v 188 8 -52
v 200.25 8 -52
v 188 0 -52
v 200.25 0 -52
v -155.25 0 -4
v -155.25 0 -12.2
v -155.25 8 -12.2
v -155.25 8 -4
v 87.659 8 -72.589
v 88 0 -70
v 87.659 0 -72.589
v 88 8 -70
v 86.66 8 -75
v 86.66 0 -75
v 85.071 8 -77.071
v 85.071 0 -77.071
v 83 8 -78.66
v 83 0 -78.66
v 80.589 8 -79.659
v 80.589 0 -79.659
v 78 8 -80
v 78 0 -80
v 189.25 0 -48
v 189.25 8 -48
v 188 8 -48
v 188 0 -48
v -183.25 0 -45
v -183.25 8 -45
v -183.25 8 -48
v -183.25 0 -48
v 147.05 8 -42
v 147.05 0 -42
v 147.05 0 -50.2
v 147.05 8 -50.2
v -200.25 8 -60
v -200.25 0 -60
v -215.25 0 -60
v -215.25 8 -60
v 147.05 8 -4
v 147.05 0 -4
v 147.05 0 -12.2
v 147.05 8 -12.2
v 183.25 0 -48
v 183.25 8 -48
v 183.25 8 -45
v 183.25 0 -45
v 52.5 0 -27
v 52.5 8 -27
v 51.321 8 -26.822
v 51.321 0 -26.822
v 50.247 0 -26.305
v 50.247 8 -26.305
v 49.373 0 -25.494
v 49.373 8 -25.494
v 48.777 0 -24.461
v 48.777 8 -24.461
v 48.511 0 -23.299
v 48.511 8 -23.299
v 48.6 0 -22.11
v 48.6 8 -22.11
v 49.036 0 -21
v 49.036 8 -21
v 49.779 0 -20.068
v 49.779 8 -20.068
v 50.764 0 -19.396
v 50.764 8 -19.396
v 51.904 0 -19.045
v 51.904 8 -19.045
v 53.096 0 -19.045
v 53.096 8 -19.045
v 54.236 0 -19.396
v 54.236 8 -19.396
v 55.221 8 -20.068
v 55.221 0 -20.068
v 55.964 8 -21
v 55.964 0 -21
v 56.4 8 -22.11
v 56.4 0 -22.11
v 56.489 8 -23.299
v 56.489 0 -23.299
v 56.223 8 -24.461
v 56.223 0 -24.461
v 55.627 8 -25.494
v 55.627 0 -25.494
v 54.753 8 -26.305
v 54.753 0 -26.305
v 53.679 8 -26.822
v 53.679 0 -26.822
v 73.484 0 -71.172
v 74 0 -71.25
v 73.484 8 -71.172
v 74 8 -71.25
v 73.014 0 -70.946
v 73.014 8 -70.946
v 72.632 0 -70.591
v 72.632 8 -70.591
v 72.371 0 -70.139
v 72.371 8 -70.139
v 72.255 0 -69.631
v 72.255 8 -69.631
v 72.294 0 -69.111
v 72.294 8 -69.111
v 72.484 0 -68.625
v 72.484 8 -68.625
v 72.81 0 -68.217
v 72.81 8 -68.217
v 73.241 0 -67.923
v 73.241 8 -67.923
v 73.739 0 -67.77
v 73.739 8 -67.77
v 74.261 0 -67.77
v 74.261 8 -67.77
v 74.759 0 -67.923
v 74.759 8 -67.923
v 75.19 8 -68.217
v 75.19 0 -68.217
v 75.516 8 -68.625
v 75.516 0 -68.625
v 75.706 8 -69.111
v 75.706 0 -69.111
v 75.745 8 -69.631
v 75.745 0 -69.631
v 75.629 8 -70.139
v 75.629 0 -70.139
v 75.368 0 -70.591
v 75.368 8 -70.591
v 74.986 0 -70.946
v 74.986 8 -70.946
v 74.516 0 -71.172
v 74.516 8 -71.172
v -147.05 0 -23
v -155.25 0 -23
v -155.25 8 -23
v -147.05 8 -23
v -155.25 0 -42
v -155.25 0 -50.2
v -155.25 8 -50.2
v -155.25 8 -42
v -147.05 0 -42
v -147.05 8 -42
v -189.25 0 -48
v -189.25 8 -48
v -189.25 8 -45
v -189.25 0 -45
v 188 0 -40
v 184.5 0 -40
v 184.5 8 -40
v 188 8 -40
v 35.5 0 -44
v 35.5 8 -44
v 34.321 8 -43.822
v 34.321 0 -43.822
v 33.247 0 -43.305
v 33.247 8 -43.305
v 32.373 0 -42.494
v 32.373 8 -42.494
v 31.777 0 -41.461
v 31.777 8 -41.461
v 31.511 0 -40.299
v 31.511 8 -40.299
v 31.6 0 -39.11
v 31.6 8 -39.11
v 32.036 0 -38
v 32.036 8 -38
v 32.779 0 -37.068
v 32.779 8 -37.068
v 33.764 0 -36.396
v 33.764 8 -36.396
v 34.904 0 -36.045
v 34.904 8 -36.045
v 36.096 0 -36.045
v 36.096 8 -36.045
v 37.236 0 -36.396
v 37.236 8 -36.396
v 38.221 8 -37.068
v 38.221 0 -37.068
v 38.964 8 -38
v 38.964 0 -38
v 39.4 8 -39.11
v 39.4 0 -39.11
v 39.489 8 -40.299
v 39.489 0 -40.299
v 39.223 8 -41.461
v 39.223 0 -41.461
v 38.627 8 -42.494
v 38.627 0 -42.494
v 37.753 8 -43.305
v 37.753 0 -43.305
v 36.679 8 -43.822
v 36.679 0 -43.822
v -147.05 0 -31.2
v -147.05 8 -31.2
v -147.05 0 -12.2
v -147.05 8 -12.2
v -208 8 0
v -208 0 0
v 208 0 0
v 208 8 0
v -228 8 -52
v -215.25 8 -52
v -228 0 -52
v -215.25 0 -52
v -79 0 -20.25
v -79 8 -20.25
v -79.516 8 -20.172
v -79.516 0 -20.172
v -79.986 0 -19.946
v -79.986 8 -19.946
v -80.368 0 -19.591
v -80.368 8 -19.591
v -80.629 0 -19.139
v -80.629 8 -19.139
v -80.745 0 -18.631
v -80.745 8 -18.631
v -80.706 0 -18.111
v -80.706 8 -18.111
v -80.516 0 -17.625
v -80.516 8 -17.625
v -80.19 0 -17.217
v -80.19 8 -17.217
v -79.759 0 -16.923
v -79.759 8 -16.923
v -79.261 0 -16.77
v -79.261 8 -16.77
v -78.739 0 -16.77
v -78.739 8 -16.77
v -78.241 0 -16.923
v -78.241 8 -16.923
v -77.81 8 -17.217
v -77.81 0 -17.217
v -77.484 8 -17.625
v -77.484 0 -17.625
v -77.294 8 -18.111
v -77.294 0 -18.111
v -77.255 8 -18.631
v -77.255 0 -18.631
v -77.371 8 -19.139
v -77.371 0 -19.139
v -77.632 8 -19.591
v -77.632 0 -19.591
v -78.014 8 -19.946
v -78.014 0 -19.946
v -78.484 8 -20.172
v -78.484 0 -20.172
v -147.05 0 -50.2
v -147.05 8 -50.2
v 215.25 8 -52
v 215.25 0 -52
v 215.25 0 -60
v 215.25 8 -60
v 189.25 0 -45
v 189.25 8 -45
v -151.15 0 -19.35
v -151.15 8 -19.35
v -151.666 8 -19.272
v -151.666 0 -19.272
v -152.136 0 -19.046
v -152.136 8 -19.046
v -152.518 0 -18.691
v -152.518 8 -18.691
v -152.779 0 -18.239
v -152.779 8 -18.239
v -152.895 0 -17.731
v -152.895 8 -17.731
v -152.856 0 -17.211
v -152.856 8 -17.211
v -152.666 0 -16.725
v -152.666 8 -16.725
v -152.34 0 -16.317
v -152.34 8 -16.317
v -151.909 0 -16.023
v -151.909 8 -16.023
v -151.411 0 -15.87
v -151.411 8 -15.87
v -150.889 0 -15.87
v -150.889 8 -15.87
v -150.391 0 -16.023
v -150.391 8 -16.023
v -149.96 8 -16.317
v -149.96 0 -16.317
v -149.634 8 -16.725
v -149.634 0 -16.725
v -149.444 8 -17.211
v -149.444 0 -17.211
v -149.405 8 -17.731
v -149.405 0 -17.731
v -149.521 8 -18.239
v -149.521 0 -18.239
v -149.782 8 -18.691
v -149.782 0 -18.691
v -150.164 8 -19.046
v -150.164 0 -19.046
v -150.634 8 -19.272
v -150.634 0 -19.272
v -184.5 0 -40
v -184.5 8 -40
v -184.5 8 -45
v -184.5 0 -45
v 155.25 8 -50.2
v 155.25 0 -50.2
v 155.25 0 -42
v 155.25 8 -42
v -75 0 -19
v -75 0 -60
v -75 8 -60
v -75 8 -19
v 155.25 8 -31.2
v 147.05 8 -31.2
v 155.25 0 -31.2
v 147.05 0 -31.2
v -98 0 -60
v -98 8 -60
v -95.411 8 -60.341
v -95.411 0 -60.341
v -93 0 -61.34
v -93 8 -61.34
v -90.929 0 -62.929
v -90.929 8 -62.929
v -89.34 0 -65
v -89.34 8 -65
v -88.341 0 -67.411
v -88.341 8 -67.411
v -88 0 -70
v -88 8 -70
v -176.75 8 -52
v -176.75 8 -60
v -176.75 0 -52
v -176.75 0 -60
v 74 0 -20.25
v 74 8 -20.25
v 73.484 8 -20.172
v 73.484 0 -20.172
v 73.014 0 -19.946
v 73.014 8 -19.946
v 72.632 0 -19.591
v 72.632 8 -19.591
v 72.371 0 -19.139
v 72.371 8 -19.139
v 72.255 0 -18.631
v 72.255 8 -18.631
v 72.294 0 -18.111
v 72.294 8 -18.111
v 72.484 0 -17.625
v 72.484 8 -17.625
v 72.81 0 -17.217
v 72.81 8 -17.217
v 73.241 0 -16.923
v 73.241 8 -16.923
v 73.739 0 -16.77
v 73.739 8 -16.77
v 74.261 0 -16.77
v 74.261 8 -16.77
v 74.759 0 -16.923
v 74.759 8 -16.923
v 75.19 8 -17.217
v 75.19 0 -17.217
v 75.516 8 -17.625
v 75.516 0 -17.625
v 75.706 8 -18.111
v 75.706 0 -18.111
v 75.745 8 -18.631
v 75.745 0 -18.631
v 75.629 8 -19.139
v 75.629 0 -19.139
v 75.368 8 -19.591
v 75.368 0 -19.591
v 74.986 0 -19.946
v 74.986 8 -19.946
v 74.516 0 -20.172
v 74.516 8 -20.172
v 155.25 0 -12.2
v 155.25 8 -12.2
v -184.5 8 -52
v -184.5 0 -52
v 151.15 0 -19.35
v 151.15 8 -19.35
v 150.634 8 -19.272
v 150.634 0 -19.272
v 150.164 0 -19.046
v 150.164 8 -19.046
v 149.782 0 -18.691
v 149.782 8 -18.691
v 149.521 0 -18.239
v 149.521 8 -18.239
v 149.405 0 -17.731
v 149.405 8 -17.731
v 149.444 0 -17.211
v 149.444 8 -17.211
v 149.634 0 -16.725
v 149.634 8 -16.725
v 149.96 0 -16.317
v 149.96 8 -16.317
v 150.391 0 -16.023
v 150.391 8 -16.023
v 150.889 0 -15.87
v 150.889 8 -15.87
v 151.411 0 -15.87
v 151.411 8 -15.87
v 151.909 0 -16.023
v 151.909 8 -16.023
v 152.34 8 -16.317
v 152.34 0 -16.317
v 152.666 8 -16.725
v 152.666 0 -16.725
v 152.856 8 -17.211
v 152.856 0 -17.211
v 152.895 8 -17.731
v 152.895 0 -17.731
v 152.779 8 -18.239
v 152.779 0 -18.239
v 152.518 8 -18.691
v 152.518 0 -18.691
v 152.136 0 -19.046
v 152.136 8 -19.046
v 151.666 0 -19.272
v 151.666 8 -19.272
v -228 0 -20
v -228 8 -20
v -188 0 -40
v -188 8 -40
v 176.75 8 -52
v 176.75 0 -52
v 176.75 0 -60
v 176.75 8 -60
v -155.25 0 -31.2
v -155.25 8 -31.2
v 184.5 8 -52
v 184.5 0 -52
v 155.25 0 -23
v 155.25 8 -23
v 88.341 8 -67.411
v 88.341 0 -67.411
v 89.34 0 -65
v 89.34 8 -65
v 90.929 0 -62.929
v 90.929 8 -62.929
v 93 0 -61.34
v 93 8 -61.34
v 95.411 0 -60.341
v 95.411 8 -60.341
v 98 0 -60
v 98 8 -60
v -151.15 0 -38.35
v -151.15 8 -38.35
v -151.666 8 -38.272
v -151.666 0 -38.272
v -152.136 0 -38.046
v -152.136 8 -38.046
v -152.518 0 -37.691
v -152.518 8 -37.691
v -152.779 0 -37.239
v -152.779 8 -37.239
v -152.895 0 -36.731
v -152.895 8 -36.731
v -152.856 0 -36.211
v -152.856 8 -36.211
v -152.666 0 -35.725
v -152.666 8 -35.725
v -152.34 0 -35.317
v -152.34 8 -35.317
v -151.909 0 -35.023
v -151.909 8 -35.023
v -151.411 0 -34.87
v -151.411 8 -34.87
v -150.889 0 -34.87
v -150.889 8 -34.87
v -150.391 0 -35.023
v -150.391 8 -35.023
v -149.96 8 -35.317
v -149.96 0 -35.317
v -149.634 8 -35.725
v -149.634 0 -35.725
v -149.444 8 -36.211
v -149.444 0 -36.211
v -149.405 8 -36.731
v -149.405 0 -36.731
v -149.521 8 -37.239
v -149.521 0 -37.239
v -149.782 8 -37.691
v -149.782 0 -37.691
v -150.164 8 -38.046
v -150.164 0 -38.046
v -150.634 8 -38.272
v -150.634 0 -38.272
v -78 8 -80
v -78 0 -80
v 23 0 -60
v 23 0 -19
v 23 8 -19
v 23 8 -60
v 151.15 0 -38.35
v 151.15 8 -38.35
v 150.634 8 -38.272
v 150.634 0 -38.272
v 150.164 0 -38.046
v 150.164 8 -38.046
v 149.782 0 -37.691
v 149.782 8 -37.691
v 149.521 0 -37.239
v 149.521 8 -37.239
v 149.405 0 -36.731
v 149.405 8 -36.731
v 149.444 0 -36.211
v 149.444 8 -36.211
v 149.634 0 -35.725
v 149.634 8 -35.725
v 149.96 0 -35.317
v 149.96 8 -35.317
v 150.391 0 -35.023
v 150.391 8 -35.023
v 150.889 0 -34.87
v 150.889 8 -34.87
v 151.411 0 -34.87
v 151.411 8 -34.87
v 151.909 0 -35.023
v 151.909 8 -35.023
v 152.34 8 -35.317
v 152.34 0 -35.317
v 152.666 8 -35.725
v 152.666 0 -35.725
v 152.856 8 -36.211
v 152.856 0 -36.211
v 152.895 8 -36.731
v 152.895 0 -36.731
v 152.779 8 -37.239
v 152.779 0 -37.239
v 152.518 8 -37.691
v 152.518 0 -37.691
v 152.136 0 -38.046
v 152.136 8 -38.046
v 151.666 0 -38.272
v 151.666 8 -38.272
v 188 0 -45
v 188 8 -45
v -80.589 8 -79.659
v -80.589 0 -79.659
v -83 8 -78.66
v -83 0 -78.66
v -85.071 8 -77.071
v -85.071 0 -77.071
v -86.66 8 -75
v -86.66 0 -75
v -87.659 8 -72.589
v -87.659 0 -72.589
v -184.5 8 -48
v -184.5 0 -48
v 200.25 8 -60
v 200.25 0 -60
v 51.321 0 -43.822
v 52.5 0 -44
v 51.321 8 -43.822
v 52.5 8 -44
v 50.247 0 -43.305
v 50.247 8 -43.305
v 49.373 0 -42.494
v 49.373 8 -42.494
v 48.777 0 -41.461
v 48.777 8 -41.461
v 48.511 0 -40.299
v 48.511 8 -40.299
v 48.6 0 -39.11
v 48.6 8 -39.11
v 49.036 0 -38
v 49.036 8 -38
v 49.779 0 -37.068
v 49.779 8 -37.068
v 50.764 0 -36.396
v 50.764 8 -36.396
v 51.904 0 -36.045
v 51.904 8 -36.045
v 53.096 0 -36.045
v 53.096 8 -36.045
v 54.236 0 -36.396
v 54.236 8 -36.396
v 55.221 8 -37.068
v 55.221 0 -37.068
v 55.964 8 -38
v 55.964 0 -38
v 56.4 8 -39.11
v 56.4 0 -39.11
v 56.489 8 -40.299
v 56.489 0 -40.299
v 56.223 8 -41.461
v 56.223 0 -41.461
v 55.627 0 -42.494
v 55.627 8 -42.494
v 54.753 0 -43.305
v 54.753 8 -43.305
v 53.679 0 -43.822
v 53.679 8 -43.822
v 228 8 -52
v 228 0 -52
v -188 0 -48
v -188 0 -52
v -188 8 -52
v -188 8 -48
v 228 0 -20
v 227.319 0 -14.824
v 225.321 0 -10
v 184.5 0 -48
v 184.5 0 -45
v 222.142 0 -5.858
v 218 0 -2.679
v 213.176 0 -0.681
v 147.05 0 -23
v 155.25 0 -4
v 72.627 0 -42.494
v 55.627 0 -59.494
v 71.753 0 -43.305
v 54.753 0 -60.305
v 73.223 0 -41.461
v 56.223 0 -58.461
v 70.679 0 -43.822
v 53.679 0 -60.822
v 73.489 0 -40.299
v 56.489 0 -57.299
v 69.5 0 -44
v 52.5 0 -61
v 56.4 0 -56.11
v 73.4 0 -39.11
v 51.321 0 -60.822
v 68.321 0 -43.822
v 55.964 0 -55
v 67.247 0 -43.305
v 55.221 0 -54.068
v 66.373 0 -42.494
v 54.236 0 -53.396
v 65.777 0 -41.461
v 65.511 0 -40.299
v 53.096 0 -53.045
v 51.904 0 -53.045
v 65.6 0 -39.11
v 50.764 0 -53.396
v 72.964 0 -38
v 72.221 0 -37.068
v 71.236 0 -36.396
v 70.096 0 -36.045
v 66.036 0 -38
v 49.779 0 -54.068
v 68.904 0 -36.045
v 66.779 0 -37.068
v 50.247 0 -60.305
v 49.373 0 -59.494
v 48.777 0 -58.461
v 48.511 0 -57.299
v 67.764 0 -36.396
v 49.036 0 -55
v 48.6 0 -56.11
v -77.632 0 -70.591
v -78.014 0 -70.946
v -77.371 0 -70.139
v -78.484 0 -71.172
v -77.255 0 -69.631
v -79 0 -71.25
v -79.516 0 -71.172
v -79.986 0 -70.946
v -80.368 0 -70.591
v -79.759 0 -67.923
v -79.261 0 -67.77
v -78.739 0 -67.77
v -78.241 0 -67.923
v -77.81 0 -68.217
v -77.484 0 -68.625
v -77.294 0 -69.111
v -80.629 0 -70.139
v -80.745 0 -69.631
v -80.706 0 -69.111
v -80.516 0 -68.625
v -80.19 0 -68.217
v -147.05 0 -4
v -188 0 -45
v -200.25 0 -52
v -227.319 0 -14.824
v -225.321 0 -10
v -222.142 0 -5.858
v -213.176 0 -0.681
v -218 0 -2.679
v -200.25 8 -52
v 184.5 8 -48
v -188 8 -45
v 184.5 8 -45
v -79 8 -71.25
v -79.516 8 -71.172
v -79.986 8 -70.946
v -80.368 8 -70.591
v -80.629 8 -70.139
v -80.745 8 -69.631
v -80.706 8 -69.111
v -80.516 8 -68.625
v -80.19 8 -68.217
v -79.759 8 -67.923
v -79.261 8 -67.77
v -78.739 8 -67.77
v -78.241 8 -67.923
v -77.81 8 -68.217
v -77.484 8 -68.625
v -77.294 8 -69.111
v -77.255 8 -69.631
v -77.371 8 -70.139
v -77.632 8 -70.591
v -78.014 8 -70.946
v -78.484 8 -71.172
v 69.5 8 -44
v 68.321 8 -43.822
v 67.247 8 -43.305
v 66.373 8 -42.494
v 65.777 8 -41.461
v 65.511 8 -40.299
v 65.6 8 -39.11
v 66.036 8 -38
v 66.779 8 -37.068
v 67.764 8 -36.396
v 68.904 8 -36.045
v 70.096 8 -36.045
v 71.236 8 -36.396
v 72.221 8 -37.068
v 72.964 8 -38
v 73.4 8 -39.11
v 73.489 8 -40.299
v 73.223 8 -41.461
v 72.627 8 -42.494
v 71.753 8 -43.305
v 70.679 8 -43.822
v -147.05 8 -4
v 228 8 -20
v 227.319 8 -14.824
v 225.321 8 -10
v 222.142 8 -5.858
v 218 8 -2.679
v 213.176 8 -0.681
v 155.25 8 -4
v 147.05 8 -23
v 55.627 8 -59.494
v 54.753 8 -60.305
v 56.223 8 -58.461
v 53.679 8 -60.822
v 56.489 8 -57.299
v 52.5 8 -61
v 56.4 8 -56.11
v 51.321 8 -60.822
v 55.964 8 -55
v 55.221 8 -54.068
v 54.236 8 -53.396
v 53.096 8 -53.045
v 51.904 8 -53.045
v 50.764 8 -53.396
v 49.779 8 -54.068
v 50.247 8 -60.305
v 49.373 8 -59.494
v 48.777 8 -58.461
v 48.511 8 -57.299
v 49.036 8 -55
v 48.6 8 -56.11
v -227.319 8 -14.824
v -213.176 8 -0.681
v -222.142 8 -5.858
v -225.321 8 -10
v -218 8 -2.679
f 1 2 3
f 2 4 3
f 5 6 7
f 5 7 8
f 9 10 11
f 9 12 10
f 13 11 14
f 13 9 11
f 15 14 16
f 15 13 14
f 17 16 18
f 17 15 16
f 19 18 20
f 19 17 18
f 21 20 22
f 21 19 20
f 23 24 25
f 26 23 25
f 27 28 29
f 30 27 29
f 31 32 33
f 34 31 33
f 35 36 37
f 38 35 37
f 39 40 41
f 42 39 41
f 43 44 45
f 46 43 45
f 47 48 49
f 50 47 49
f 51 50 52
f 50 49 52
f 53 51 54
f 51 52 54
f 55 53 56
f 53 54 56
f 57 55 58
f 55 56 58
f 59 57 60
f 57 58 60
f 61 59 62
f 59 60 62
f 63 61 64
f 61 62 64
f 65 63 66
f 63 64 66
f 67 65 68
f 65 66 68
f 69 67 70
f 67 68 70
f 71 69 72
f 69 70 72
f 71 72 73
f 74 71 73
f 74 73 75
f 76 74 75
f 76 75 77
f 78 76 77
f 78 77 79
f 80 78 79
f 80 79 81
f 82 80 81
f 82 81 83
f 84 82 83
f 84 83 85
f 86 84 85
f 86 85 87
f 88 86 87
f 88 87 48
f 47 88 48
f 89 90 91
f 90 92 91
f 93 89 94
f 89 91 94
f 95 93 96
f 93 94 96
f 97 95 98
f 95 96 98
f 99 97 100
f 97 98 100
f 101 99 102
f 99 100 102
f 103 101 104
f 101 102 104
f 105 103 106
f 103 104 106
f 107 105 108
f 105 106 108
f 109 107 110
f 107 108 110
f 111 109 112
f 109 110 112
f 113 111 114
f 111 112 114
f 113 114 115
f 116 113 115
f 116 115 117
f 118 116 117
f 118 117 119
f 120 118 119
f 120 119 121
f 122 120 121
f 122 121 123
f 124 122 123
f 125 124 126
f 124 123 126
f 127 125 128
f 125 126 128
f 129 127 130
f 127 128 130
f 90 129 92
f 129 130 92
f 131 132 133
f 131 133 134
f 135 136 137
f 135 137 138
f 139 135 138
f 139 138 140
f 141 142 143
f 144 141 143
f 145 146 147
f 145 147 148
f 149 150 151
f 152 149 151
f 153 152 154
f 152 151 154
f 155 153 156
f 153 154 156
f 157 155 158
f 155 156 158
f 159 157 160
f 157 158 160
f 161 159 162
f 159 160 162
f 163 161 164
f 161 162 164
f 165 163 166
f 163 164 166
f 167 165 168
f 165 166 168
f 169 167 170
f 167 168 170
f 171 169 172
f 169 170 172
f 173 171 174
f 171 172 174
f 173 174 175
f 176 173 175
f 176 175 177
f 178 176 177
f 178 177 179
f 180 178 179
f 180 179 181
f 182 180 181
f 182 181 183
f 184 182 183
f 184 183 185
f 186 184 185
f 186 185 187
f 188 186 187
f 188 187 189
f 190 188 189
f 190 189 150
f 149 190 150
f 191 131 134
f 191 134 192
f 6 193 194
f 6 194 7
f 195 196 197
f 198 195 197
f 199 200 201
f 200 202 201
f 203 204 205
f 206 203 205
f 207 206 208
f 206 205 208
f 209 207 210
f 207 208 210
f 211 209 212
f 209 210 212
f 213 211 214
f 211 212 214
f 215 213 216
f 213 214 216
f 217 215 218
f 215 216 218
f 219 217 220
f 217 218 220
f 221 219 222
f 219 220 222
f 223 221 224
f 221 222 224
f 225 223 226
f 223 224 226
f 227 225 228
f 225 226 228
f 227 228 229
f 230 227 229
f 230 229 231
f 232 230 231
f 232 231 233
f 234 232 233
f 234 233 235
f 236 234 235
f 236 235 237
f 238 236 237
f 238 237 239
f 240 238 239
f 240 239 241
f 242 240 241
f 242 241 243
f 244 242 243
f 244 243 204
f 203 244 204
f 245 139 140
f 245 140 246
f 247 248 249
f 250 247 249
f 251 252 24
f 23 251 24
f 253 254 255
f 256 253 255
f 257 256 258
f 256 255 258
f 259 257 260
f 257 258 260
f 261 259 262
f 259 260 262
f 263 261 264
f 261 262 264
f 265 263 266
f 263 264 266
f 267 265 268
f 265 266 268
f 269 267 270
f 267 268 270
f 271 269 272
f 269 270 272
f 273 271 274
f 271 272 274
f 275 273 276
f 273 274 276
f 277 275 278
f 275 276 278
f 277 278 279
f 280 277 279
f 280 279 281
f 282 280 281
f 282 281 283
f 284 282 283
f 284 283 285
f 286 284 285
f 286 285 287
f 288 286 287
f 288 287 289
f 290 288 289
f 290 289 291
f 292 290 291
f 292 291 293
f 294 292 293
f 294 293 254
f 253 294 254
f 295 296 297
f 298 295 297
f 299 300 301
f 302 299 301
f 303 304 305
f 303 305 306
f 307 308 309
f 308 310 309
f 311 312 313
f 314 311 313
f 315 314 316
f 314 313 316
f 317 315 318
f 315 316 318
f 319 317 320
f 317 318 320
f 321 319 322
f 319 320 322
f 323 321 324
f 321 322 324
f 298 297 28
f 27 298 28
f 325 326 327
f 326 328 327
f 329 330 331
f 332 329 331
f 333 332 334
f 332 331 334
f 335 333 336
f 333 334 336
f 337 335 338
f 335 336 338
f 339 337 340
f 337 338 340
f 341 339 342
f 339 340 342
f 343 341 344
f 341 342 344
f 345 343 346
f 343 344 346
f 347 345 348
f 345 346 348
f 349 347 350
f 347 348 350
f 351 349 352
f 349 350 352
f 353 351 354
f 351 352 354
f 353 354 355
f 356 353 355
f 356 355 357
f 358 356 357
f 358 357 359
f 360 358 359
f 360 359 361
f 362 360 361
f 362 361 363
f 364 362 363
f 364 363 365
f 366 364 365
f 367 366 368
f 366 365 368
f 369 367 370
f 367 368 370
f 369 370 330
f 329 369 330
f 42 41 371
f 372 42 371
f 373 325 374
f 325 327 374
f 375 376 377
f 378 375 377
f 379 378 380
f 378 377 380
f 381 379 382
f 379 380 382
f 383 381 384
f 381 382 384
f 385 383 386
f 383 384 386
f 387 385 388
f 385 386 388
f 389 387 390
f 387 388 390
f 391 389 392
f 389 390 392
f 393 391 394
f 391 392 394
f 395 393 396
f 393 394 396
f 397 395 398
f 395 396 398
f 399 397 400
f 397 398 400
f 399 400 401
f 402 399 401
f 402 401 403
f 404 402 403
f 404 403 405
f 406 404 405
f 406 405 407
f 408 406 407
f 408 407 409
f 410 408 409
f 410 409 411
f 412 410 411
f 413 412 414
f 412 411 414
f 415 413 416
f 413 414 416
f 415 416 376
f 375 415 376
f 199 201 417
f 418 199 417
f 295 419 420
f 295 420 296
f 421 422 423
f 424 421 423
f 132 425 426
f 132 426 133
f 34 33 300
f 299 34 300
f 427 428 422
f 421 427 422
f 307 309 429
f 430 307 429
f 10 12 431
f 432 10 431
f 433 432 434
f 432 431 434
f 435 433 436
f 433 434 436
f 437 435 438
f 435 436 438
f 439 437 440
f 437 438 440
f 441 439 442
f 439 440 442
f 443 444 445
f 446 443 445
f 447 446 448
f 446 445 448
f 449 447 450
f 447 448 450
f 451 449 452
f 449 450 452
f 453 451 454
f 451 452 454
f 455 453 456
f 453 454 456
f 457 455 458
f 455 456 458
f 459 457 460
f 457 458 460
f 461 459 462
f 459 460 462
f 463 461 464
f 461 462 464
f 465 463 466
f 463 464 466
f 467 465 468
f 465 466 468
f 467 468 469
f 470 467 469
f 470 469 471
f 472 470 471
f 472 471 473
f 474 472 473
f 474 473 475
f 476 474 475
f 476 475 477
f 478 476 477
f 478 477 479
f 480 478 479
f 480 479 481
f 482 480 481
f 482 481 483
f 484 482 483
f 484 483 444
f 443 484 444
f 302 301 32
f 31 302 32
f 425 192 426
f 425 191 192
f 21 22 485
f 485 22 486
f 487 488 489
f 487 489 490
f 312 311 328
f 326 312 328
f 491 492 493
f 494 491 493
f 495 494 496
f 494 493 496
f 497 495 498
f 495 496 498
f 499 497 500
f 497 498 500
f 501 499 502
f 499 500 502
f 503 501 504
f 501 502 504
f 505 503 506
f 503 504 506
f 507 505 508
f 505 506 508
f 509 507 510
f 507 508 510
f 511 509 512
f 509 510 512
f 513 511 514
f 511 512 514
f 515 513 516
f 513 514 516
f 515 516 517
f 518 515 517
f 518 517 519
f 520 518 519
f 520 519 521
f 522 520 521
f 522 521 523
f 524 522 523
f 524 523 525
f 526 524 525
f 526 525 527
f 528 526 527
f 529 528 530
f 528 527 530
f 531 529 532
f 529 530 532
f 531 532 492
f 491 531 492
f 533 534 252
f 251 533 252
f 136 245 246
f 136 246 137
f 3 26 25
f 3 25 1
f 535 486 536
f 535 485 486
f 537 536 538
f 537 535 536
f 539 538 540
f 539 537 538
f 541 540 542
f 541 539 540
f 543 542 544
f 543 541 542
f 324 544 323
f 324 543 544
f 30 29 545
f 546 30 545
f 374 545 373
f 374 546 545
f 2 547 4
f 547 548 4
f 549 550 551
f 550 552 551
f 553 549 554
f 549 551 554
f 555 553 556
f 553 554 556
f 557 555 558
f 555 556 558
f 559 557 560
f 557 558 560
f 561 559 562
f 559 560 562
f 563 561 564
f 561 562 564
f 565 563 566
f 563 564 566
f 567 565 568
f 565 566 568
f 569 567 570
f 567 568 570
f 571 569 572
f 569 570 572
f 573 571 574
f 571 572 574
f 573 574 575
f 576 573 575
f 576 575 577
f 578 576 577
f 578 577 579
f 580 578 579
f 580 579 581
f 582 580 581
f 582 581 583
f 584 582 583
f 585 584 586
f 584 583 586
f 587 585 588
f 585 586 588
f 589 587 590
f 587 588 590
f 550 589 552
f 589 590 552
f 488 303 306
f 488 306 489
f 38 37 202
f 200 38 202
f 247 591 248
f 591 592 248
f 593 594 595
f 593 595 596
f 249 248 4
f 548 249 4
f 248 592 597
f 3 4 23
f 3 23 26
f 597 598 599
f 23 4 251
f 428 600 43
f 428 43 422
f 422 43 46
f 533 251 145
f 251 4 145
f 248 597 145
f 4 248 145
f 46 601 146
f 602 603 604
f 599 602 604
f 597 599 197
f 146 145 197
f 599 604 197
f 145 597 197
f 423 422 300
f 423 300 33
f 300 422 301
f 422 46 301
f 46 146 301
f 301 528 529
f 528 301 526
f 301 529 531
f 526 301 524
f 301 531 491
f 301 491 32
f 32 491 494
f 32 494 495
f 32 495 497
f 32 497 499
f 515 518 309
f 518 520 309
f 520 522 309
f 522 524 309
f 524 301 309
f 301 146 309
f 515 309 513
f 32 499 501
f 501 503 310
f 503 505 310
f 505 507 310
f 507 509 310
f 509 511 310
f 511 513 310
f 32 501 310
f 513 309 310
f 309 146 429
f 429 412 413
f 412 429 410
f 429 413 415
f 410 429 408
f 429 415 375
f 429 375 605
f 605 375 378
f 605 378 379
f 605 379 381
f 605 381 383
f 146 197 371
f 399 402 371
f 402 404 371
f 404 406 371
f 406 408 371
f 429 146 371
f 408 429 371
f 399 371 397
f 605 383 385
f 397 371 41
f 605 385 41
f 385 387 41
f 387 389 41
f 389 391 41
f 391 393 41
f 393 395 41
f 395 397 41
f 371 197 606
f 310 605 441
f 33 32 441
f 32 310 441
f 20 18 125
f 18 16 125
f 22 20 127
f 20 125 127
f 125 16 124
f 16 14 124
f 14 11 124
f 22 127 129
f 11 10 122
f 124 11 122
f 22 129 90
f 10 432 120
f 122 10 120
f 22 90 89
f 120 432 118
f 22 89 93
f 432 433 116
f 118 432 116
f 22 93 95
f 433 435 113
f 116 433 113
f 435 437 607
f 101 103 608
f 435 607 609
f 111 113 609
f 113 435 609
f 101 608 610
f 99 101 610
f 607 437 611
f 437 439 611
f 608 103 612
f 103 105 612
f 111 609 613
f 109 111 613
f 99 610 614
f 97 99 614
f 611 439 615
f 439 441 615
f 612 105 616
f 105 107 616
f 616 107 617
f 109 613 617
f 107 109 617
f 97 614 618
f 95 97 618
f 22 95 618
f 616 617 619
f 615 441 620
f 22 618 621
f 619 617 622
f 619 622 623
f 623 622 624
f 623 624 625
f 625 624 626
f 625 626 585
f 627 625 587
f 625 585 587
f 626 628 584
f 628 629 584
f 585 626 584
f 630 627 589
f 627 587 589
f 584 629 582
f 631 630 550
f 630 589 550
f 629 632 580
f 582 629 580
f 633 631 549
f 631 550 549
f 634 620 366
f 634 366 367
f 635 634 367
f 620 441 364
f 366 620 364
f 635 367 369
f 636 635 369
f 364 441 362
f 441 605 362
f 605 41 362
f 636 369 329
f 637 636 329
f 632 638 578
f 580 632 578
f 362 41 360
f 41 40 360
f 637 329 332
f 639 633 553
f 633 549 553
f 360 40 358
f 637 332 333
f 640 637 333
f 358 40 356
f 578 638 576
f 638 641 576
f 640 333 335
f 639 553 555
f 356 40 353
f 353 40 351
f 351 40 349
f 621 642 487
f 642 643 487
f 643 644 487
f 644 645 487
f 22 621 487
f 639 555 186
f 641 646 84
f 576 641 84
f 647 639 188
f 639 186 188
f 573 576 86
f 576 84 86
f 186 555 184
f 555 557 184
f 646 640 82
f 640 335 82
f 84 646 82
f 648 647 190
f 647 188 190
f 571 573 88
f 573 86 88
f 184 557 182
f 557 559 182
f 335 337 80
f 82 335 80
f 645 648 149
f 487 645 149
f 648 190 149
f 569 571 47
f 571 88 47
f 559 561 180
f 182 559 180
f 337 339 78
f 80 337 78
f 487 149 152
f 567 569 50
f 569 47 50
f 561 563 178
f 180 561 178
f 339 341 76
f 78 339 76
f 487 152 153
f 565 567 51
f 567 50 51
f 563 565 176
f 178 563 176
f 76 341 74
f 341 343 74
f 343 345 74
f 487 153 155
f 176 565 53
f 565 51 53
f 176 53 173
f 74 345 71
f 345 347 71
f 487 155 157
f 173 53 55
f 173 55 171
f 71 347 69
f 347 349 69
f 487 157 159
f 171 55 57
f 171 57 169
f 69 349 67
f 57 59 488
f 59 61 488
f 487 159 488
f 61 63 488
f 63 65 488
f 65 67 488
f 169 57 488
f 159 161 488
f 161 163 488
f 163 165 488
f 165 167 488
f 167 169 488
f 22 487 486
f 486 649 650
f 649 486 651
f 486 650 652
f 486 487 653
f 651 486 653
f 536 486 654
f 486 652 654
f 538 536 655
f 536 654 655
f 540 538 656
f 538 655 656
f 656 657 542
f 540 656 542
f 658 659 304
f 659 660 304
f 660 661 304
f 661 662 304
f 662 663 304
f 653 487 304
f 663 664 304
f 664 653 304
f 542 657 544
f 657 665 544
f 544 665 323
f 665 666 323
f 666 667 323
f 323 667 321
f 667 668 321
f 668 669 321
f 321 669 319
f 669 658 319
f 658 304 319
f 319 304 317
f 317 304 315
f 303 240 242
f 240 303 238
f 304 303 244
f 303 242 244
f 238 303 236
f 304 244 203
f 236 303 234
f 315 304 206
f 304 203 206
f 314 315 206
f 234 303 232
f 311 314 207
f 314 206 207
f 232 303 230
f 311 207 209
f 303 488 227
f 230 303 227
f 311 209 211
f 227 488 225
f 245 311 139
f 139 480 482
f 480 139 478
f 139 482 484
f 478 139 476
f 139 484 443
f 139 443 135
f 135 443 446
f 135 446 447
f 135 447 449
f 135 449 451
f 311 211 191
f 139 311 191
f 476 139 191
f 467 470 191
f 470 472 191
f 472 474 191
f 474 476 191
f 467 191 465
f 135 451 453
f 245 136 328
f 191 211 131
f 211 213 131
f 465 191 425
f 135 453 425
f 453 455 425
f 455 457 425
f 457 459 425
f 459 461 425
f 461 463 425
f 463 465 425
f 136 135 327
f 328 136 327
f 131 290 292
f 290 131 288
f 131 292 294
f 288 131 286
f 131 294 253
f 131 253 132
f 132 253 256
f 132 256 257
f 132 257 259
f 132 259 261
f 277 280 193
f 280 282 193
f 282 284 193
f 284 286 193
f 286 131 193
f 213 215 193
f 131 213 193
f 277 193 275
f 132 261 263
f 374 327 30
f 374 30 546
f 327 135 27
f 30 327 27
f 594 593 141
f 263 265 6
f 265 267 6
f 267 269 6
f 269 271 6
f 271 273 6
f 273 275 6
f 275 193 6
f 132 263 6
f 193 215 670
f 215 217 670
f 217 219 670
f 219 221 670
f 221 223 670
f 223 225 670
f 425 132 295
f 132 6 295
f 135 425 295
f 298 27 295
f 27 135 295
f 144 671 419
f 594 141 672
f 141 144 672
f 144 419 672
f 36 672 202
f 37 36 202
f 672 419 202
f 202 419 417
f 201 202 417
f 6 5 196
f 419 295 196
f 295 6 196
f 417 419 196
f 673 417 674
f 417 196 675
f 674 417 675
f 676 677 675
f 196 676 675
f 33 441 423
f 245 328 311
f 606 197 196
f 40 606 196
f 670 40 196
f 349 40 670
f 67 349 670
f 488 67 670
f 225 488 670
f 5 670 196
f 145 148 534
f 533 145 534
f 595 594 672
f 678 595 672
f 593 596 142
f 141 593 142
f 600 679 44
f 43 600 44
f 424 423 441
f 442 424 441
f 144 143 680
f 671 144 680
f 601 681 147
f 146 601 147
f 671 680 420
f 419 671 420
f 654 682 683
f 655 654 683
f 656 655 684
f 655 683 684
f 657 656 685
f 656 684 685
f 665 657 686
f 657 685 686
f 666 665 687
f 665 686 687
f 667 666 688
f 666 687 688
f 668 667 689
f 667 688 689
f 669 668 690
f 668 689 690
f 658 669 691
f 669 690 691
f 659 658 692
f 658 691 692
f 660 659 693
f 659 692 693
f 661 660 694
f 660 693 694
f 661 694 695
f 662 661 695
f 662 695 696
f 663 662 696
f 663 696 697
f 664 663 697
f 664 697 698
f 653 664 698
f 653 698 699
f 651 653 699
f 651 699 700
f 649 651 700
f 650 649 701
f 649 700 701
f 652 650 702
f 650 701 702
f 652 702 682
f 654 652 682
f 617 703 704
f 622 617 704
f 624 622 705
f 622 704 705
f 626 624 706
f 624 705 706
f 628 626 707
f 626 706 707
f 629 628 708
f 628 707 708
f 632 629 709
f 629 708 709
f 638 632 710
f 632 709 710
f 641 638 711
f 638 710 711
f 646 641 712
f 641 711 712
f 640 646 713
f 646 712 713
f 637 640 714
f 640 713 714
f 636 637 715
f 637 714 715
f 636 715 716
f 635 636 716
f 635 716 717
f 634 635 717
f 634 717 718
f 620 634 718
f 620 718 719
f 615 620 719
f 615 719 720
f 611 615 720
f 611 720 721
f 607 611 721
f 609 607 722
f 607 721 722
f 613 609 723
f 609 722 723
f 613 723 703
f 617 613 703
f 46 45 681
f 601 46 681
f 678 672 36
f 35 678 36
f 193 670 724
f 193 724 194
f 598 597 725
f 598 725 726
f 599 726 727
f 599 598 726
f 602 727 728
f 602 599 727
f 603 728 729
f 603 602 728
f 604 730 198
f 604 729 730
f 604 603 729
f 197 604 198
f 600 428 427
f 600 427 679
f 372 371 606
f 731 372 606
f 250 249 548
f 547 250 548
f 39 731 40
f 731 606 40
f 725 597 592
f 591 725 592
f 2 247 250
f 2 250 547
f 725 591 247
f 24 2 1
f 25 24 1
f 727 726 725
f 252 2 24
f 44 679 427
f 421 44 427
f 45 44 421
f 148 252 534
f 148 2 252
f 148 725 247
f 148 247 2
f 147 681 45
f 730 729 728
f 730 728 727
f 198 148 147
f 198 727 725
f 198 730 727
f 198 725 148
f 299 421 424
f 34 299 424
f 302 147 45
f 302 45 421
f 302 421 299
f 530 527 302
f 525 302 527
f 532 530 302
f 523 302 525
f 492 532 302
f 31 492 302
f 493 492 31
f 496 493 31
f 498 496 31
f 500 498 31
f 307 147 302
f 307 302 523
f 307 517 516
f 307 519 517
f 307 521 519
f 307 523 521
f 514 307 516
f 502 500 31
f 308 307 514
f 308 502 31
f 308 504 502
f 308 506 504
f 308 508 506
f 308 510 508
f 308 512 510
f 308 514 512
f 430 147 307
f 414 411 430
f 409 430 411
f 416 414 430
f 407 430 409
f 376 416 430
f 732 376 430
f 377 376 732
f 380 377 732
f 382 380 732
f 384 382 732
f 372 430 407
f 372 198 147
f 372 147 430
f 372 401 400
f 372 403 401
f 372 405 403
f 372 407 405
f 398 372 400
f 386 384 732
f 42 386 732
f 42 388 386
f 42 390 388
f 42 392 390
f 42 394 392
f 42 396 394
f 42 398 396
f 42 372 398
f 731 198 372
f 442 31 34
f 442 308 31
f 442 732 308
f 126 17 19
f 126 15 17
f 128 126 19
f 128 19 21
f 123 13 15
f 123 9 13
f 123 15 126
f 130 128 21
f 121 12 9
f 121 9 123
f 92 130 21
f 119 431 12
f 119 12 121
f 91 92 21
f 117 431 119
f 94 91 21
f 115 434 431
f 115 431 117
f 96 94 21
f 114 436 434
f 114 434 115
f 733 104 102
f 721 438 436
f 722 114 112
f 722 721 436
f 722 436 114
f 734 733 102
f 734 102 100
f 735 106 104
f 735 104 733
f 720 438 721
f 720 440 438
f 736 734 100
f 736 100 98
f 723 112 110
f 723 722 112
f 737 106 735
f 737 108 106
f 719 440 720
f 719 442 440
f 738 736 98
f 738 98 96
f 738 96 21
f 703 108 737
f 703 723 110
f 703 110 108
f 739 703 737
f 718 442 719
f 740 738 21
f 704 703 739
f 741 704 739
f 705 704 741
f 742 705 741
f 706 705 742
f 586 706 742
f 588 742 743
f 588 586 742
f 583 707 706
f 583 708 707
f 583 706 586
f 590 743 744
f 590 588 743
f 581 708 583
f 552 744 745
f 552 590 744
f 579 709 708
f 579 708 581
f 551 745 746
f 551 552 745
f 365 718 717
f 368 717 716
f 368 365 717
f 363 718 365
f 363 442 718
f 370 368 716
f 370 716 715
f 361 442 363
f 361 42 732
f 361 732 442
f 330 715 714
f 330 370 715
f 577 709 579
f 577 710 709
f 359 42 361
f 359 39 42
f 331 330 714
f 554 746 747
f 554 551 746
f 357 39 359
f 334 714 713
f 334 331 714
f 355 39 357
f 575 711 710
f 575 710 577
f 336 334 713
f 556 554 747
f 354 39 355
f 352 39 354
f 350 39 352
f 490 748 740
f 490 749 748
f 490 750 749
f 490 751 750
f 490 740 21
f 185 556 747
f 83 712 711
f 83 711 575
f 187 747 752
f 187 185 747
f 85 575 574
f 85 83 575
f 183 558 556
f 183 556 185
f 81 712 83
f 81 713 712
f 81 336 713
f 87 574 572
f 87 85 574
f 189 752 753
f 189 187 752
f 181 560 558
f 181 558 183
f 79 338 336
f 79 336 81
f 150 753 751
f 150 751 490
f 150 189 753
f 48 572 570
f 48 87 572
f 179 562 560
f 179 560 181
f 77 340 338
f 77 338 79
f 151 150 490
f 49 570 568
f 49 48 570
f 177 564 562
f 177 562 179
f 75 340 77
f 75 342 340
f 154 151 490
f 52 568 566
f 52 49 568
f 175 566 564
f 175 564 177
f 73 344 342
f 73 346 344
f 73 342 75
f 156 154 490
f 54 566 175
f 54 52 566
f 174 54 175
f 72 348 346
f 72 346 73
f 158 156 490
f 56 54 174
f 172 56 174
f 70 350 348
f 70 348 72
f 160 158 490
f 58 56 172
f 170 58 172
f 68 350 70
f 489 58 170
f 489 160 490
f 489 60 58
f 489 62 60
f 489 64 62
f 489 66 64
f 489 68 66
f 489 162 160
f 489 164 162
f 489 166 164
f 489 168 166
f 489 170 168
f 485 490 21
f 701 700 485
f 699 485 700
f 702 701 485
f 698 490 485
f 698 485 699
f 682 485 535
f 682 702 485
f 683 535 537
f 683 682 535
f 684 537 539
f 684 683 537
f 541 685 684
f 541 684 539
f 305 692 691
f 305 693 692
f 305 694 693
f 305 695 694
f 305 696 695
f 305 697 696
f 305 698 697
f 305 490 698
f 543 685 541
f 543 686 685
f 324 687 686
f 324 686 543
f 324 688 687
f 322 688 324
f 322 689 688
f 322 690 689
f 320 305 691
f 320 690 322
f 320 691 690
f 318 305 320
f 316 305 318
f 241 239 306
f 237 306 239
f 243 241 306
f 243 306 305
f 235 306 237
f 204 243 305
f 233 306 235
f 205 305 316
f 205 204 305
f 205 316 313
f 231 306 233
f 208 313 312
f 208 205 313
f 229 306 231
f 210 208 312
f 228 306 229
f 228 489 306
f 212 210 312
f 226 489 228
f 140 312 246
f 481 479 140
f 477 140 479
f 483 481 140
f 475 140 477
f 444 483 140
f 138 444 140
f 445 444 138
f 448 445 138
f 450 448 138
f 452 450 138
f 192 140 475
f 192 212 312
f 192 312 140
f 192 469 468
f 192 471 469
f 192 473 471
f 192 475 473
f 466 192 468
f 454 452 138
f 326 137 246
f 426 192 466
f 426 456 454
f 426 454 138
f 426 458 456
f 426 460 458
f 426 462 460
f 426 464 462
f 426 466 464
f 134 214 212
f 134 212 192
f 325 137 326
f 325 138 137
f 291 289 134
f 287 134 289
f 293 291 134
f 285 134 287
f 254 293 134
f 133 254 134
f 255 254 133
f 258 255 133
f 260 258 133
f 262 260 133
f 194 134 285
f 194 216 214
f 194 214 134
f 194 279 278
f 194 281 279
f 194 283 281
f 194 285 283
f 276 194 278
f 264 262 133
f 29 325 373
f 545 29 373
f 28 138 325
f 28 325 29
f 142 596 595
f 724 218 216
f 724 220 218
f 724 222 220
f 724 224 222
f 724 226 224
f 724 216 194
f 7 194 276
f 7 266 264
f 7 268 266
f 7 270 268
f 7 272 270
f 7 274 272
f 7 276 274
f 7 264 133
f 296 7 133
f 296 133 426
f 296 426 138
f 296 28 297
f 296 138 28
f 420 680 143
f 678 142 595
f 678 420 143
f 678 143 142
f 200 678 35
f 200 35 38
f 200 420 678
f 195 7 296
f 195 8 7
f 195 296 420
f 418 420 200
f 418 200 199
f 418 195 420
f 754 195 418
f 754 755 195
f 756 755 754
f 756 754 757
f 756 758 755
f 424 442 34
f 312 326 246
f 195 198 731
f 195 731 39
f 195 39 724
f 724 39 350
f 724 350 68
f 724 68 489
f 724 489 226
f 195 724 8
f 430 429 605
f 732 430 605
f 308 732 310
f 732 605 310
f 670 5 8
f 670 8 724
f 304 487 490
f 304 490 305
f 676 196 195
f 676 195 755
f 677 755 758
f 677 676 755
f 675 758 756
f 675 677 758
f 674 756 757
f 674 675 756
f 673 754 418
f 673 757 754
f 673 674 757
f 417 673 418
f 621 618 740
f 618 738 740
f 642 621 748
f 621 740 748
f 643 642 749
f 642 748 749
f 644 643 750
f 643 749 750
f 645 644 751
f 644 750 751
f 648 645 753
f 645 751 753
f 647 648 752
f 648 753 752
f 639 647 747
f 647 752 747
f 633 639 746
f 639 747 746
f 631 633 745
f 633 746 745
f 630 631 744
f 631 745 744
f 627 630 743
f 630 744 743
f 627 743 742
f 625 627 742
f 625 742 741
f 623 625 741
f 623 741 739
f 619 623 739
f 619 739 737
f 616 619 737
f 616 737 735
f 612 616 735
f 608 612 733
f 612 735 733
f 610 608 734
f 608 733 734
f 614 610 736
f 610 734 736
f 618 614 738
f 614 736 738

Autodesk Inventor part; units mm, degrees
ref_plane "YZ Plane" through (0, 0, 0) normal (1, 0, 0) x (0, 1, 0)
ref_plane "XY Plane" through (0, 0, 0) normal (0, 0, 1) x (1, 0, 0)
sketch "Sketch1" plane through (0, 0, 0) normal (0, 1, 0) x (-1, 0, 0)
  line L0 (208, 0) -> (-208, 0)
  line L1 (-228, -20) -> (-228, -52)
  line L2 (-228, -52) -> (-215.25, -52)
  line L3 (-215.25, -52) -> (-215.25, -60)
  line L4 (-215.25, -60) -> (-200.25, -60)
  line L5 (-200.25, -60) -> (-200.25, -52)
  line L6 (-200.25, -52) -> (-176.75, -52)
  line L7 (-176.75, -52) -> (-176.75, -60)
  line L8 (-176.75, -60) -> (-88, -60)
  line L9 (-88, -60) -> (-88, -80)
  line L10 (-88, -80) -> (88, -80)
  line L11 (88, -80) -> (88, -60)
  line L12 (88, -60) -> (176.75, -60)
  line L13 (176.75, -60) -> (176.75, -52)
  line L14 (176.75, -52) -> (200.25, -52)
  line L15 (200.25, -52) -> (200.25, -60)
  line L16 (200.25, -60) -> (215.25, -60)
  line L17 (215.25, -60) -> (215.25, -52)
  line L18 (215.25, -52) -> (228, -52)
  line L19 (228, -52) -> (228, -20)
  line L20 (0, -80) -> (0, 0) construction
  arc A0 (228, -20) -> (208, 0) centre (208, -20) ccw
  arc A1 (-208, 0) -> (-228, -20) centre (-208, -20) ccw
  line L21 (75, -19) -> (-23, -19)
  line L22 (-23, -19) -> (-23, -60)
  line L23 (-23, -60) -> (75, -60)
  line L24 (75, -60) -> (75, -19)
  line L25 (155.25, -4) -> (147.05, -4)
  line L26 (147.05, -4) -> (147.05, -12.2)
  line L27 (147.05, -12.2) -> (155.25, -12.2)
  line L28 (155.25, -12.2) -> (155.25, -4)
  line L29 (155.25, -23) -> (147.05, -23)
  line L30 (147.05, -23) -> (147.05, -31.2)
  line L31 (147.05, -31.2) -> (155.25, -31.2)
  line L32 (155.25, -31.2) -> (155.25, -23)
  line L33 (155.25, -42) -> (147.05, -42)
  line L34 (147.05, -42) -> (147.05, -50.2)
  line L35 (147.05, -50.2) -> (155.25, -50.2)
  line L36 (155.25, -50.2) -> (155.25, -42)
  line L37 (151.15, -42) -> (151.15, -31.2) construction
  line L38 (151.15, -23) -> (151.15, -12.2) construction
  line L39 (-155.25, -4) -> (-147.05, -4)
  line L40 (-147.05, -4) -> (-147.05, -12.2)
  line L41 (-147.05, -12.2) -> (-155.25, -12.2)
  line L42 (-155.25, -12.2) -> (-155.25, -4)
  line L43 (-155.25, -23) -> (-147.05, -23)
  line L44 (-147.05, -23) -> (-147.05, -31.2)
  line L45 (-147.05, -31.2) -> (-155.25, -31.2)
  line L46 (-155.25, -31.2) -> (-155.25, -23)
  line L47 (-155.25, -42) -> (-147.05, -42)
  line L48 (-147.05, -42) -> (-147.05, -50.2)
  line L49 (-147.05, -50.2) -> (-155.25, -50.2)
  line L50 (-155.25, -50.2) -> (-155.25, -42)
  line L51 (-151.15, -42) -> (-151.15, -31.2) construction
  line L52 (-151.15, -23) -> (-151.15, -12.2) construction
  line L53 (79, -69.5) -> (-74, -69.5) construction
  line L54 (-74, -69.5) -> (-74, -18.5) construction
  line L55 (-74, -18.5) -> (79, -18.5) construction
  line L56 (79, -18.5) -> (79, -69.5) construction
  line L57 (-35.5, -40) -> (-69.5, -40) construction
  line L58 (-52.5, -57) -> (-52.5, -23) construction
  line L59 (188, -52) -> (188, -48)
  line L60 (188, -48) -> (189.25, -48)
  line L61 (189.25, -48) -> (189.25, -45)
  line L62 (189.25, -45) -> (188, -45)
  line L63 (188, -45) -> (188, -40)
  line L64 (188, -40) -> (184.5, -40)
  line L65 (184.5, -40) -> (184.5, -45)
  line L66 (184.5, -45) -> (183.25, -45)
  line L67 (183.25, -45) -> (183.25, -48)
  line L68 (183.25, -48) -> (184.5, -48)
  line L69 (184.5, -48) -> (184.5, -52)
  line L70 (-184.5, -52) -> (-184.5, -48)
  line L71 (-184.5, -48) -> (-183.25, -48)
  line L72 (-183.25, -48) -> (-183.25, -45)
  line L73 (-183.25, -45) -> (-184.5, -45)
  line L74 (-184.5, -45) -> (-184.5, -40)
  line L75 (-184.5, -40) -> (-188, -40)
  line L76 (-188, -40) -> (-188, -45)
  line L77 (-188, -45) -> (-189.25, -45)
  line L78 (-189.25, -45) -> (-189.25, -48)
  line L79 (-189.25, -48) -> (-188, -48)
  line L80 (-188, -48) -> (-188, -52)
  point P0 (228, 0)
  point P1 (-228, 0)
  point P2 (151.15, -36.6)
  point P3 (151.15, -17.6)
  point P4 (-151.15, -36.6)
  point P5 (-151.15, -17.6)
  point P6 (-52.5, -40)
  point P7 (-52.5, -40)
  dimension "d0" = 456
  dimension "d1" = 80
  dimension "d2" = 60
  dimension "d3" = 8
  dimension "d4" = 140
  dimension "d5" = 23.5
  dimension "d6" = 15
  dimension "d7" = 12.75
  dimension "d8" = 20
  dimension "d9" = 19
  dimension "d10" = 41
  dimension "d11" = 98
  dimension "d12" = 153
  dimension "d13" = 8.2
  dimension "d14" = 8.2
  dimension "d15" = 72.75
  dimension "d16" = 4
  dimension "d17" = 23
  dimension "d18" = 42
  dimension "d19" = 18.5
  dimension "d20" = 51
  dimension "d21" = 153
  dimension "d22" = 149
  dimension "d23" = 40
  dimension "d24" = 29.5
  dimension "d25" = 34
  dimension "d26" = 34
  dimension "d27" = 4
  dimension "d28" = 3
  dimension "d29" = 5
  dimension "d30" = 6
  dimension "d31" = 3.5
  dimension "d32" = 40
  dimension "d34" = 3.5
  dimension "d35" = 6
  dimension "d36" = 40
extrude "Extrusion1" add sketch "Sketch1" along normal blind 8 contours A0 L19 L18 L17 L16 L15 L14 L59 L60 L61 L62 L63 L64 L65 L66 L67 L68 L69 L13 L12 L11 L10 L9 L8 L7 L6 L70 L71 L72 L73 L74 L75 L76 L77 L78 L79 L80 L5 L4 L3 L2 L1 A1 L0
fillet "Fillet1" radius 10 4 edges at (-88, 4, -60) (-88, 4, -80) (88, 4, -80) (88, 4, -60)
hole "Hole1" at (-151.15, 0, -36.6) at (-151.15, 0, -17.6) at (151.15, 0, -17.6) at (151.15, 0, -36.6) at (-79, 0, -69.5) at (-79, 0, -18.5) at (74, 0, -18.5) at (74, 0, -69.5) direction (0, 1, 0) diameter 3.5 end through all
hole "Hole2" at (35.5, 0, -40) at (52.5, 0, -57) at (52.5, 0, -40) at (69.5, 0, -40) at (52.5, 0, -23) direction (0, 1, 0) diameter 8 end through all
ref_plane "Work Plane2" through (0, 4, 0) normal (0, 1, 0) x (-1, 0, 0)
equation "\"d34\" = d31"
equation "\"d35\" = d30"
equation "\"d36\" = d32"
equation "\"d55\" = 0.5 * THICKNESS"
equation "\"THICKNESS\" = 8"
properties part number "A8-0011"
